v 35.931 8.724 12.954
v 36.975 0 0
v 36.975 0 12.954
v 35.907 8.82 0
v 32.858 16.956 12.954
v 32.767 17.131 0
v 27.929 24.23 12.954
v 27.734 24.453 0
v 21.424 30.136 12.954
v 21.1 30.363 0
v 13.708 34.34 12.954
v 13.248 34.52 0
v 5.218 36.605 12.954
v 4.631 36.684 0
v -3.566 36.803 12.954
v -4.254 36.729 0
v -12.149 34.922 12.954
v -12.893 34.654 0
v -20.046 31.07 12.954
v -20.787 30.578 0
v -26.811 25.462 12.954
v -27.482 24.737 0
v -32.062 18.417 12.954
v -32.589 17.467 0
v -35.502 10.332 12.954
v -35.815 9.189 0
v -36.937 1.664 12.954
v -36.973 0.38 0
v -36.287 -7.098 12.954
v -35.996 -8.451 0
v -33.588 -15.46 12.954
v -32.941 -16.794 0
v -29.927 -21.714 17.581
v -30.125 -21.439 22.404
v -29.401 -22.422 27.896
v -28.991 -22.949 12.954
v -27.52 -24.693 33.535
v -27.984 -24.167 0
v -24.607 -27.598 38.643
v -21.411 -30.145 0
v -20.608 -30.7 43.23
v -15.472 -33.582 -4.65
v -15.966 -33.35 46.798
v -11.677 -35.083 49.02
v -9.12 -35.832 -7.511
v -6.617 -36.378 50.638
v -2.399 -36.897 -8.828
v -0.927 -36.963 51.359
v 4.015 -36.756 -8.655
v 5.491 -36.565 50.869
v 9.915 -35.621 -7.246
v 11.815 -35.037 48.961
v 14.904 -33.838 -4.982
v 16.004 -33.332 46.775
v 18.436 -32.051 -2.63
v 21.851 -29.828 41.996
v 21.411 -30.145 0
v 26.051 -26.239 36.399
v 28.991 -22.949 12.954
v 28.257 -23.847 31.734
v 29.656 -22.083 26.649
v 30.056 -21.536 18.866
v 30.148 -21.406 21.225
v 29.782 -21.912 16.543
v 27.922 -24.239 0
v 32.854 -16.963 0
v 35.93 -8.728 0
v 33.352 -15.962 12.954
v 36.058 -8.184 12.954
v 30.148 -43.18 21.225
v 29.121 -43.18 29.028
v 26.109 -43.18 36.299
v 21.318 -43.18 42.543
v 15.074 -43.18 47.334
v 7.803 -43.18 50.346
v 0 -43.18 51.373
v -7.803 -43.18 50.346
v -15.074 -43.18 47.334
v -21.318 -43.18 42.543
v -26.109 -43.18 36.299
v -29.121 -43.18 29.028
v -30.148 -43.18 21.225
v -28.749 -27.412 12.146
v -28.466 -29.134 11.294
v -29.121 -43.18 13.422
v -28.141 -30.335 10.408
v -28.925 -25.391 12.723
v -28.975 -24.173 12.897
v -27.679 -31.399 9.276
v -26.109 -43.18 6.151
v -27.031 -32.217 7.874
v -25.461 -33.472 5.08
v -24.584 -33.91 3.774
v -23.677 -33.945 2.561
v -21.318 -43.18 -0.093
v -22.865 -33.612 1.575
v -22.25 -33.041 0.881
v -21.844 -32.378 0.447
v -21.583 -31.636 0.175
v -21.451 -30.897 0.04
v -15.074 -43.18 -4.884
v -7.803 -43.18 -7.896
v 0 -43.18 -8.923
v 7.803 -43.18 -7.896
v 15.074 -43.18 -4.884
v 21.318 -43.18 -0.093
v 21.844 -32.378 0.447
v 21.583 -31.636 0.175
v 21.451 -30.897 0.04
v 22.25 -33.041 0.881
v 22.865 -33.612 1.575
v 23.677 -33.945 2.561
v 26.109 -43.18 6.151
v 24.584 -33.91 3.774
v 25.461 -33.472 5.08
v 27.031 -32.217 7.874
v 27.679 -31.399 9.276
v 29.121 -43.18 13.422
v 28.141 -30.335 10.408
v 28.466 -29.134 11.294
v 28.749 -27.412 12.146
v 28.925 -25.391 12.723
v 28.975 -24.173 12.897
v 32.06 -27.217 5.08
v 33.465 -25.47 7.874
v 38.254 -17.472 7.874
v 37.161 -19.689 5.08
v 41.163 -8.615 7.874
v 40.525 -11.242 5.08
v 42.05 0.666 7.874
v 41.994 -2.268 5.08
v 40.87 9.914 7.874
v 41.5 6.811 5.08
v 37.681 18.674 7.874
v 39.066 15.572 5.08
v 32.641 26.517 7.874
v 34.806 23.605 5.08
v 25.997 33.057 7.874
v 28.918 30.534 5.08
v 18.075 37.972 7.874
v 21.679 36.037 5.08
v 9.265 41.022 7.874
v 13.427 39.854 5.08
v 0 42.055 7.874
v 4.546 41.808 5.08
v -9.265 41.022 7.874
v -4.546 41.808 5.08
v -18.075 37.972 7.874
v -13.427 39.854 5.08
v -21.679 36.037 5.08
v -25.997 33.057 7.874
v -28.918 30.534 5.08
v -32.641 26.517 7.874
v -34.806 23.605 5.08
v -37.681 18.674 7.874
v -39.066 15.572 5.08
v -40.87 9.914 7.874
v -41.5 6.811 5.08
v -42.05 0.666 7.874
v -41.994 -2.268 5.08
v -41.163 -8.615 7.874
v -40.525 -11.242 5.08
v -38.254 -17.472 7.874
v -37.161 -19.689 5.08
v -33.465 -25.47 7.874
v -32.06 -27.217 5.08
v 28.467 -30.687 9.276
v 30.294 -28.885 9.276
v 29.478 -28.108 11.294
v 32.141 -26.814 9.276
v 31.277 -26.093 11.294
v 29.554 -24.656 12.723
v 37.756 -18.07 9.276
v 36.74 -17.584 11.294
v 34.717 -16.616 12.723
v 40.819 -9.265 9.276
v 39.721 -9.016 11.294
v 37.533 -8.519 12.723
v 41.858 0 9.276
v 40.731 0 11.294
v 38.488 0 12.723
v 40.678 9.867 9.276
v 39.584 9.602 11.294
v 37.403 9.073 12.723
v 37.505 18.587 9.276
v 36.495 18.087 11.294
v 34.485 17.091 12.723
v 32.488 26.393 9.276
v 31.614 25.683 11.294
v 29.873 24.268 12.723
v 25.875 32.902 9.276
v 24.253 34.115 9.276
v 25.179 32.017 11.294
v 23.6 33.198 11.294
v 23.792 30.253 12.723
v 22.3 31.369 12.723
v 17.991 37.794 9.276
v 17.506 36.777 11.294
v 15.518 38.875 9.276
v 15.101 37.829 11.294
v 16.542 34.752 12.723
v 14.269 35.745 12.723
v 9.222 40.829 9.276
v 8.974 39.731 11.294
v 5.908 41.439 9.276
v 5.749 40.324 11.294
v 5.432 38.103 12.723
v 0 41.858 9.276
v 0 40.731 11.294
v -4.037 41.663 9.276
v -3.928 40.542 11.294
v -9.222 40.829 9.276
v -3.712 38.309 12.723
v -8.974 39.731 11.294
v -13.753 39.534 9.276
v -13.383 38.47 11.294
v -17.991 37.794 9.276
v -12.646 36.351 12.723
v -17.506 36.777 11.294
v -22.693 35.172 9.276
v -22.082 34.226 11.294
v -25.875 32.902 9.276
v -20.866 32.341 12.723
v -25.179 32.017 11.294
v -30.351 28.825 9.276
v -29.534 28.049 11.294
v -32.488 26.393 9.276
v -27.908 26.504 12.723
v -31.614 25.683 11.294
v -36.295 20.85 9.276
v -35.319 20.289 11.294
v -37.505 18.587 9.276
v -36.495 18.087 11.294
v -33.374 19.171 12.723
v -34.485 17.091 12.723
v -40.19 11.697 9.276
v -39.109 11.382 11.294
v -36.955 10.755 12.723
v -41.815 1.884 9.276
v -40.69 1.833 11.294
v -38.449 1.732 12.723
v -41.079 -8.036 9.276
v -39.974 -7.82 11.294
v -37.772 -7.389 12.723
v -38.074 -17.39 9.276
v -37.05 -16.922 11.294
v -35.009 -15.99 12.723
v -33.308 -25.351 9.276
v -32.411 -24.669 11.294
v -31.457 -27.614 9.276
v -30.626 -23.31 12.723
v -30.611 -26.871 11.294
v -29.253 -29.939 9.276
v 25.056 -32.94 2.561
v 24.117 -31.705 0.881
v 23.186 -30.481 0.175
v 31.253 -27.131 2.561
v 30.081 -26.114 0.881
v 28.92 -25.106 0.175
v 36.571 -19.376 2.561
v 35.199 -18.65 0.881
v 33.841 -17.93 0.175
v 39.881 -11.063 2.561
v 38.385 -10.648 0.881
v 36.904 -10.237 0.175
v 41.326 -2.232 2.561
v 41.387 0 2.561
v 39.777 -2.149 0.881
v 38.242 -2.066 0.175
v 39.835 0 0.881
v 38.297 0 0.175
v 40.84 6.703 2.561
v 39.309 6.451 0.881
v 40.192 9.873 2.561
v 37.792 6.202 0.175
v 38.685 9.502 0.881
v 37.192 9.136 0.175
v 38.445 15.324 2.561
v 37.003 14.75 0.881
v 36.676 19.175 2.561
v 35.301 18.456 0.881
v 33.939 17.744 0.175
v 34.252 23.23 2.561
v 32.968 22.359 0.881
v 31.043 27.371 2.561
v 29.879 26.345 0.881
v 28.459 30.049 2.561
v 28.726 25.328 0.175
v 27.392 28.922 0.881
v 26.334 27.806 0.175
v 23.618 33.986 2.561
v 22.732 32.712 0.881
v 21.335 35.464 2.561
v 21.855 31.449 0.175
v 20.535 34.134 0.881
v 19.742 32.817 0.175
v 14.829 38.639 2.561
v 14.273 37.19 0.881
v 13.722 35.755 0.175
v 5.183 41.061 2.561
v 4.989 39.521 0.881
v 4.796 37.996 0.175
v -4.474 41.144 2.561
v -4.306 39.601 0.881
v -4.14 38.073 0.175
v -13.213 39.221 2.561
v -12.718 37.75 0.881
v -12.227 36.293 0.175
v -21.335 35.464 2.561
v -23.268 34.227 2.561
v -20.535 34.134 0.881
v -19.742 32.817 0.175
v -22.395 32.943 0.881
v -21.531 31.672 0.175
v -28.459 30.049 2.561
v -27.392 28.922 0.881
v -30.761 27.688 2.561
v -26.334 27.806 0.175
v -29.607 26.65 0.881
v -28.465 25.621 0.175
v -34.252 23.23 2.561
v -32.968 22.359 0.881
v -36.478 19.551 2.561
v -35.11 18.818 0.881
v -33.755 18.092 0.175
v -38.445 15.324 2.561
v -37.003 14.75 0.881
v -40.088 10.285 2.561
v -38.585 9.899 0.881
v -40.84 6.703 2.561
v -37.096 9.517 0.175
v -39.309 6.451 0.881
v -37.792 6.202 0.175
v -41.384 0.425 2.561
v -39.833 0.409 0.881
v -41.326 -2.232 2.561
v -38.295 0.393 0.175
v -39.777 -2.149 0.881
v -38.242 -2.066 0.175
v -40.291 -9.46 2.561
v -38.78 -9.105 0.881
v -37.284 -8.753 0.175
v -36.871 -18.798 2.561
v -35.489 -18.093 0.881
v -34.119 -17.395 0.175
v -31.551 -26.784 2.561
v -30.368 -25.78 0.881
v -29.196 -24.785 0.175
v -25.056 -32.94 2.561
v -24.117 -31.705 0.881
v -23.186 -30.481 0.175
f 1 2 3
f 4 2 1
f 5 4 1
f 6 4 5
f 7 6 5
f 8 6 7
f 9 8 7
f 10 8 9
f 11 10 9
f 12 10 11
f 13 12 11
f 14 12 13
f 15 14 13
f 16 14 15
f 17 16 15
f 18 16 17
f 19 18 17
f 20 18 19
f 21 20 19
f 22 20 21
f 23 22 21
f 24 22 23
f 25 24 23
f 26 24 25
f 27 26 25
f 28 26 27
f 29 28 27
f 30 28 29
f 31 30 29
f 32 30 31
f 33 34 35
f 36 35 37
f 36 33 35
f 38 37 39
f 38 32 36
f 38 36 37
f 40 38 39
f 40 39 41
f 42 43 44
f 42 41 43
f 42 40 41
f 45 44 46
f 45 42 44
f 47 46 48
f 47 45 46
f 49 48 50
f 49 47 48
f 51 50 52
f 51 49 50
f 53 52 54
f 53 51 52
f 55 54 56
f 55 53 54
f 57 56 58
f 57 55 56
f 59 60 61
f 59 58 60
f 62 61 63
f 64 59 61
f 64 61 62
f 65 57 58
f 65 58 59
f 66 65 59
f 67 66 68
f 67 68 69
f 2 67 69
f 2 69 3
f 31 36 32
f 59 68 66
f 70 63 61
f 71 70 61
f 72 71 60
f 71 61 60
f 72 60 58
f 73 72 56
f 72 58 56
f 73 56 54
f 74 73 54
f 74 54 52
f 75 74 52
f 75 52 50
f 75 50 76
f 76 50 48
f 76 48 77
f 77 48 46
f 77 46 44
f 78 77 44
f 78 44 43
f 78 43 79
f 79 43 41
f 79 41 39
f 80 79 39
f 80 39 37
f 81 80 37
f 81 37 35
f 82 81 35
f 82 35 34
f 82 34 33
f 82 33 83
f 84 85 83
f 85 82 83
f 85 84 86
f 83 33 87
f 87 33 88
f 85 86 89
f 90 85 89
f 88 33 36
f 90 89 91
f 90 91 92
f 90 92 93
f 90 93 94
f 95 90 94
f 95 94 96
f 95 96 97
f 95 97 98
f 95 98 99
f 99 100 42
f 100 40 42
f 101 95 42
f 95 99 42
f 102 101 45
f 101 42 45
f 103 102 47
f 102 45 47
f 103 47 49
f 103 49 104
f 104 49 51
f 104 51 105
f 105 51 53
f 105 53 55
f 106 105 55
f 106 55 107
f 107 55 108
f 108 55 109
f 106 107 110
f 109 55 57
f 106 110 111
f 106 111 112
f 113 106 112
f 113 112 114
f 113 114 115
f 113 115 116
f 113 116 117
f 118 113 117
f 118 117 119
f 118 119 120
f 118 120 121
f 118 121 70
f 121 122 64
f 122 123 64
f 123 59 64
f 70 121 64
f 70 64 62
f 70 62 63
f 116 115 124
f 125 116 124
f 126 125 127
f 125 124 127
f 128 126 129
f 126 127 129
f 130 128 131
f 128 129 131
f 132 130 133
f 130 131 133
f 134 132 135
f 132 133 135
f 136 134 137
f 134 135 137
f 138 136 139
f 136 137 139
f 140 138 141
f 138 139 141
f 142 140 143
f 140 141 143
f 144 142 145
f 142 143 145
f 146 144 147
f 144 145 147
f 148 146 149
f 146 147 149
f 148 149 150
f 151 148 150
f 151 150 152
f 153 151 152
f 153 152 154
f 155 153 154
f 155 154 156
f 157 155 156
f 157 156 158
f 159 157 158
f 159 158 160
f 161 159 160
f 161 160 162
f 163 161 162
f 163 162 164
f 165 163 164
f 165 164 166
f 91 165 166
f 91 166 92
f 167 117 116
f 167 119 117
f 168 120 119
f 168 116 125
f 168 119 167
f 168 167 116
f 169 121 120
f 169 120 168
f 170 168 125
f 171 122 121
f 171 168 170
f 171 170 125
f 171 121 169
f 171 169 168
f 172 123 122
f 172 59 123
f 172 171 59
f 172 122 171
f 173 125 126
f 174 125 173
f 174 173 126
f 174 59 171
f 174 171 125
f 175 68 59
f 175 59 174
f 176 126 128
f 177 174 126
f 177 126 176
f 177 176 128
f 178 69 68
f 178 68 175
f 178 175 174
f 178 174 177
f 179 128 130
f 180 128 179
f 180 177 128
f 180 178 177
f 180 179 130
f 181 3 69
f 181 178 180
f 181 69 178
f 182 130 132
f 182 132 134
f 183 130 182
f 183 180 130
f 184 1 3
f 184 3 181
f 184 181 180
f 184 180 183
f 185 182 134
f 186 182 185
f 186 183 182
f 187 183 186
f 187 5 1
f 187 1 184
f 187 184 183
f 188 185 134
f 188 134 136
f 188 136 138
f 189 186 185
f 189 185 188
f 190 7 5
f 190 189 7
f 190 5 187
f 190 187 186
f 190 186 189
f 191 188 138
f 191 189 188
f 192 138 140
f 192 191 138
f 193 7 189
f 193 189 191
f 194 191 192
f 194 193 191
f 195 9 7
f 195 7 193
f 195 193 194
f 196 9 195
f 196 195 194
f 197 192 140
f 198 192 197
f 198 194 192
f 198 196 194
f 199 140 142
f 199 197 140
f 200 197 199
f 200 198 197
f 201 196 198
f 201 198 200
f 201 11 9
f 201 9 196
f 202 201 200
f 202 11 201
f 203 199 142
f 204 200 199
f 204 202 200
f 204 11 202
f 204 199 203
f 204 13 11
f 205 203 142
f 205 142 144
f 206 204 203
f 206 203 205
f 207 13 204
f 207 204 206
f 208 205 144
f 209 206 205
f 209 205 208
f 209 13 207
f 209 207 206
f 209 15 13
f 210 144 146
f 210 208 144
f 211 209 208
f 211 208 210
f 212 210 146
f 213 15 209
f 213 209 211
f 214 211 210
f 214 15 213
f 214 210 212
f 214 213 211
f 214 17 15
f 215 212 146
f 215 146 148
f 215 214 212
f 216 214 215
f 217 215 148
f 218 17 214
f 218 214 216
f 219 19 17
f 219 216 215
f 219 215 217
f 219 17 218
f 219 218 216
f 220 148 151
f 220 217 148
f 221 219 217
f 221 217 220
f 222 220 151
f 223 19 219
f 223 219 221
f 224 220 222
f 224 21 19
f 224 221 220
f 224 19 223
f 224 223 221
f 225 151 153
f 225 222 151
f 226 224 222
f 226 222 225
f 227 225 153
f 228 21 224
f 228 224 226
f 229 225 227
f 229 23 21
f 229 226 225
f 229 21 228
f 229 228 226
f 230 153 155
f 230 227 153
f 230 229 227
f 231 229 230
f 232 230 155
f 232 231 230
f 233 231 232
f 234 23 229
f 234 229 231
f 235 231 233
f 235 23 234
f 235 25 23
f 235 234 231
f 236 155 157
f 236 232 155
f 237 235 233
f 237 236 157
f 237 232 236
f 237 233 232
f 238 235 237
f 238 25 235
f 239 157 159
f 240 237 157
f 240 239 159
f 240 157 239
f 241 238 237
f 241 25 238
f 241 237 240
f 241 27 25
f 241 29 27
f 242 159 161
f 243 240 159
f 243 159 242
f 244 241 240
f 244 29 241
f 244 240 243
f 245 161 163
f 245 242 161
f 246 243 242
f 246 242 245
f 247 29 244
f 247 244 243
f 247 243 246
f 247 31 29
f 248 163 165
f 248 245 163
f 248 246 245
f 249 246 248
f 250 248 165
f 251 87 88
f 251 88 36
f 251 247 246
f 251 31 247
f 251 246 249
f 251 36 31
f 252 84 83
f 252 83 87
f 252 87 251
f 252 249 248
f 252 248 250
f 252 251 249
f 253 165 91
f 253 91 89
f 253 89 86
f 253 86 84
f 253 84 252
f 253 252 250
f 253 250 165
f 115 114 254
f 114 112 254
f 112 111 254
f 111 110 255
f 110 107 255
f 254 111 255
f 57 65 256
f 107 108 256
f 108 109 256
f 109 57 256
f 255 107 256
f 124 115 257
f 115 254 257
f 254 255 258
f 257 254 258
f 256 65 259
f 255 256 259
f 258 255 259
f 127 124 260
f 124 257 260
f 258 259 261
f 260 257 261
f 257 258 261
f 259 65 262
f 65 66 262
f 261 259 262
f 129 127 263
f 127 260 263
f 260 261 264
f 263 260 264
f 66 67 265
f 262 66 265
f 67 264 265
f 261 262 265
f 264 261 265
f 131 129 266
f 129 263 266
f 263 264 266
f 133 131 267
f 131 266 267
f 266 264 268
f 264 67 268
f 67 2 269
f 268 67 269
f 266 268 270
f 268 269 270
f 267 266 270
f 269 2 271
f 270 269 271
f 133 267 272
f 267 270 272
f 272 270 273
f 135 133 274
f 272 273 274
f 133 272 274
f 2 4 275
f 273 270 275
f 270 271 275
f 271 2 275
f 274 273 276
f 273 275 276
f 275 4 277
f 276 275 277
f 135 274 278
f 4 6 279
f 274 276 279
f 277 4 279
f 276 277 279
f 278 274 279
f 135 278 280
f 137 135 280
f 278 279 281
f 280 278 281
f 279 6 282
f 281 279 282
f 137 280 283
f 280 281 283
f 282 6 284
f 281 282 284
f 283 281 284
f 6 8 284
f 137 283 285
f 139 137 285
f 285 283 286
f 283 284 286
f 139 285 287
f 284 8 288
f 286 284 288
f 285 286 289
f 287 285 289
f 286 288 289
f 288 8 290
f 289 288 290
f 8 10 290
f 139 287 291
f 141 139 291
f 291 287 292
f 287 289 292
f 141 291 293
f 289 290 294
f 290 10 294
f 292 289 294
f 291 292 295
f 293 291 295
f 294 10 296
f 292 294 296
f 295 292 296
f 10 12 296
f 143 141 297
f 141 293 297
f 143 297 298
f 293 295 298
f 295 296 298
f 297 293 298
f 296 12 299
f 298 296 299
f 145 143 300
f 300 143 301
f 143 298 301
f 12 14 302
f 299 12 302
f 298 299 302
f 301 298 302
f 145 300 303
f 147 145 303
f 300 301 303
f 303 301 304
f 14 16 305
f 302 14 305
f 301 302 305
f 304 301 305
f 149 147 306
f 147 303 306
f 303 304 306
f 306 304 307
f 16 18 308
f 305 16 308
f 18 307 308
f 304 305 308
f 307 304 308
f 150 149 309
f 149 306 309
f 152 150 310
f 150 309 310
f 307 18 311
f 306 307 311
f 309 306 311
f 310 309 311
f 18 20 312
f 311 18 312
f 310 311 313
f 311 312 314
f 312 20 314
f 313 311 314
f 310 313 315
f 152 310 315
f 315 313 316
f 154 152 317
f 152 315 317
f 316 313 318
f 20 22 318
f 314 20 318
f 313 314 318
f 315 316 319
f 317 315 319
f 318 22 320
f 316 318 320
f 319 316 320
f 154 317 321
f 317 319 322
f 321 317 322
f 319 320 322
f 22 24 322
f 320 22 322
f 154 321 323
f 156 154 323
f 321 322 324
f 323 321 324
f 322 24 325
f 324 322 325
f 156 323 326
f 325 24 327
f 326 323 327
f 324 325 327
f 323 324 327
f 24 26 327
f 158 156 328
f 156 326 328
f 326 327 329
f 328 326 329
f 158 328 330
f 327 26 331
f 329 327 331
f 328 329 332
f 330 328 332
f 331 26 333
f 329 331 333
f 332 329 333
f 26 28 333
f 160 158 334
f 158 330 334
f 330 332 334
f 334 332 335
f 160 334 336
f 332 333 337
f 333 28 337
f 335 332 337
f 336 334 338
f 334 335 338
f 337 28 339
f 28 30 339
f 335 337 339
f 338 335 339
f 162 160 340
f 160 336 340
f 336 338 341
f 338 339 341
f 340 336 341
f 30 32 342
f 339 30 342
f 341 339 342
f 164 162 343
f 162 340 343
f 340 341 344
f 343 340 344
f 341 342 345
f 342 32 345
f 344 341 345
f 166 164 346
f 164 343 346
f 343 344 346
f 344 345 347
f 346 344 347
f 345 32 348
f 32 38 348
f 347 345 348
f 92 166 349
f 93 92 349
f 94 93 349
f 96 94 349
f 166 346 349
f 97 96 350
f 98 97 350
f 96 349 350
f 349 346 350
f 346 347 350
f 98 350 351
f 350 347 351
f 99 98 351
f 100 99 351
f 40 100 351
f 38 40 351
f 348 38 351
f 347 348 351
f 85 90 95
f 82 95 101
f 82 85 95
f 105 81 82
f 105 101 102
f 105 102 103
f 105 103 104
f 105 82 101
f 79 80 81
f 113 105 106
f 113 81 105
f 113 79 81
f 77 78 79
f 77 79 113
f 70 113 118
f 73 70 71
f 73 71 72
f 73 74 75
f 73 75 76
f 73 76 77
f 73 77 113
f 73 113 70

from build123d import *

# Parameters (mm, degrees)
F0_R     = 42.0549170166
F1_DEPTH = 12.954
F2_R     = 5.08
F4_R     = 30.1481321403
F5_DEPTH = 43.18
F6_R     = 36.9749170166
F7_DEPTH = 77.47
F8_R     = 36.9749170166
F9_DEPTH = 29.464


# Not quite as in the source:
# - a feature of the source that left no trace in its solid (it failed there, or was rolled back) is left out


with BuildPart() as f1:
    # F0 (on Top) → F1 (new body)
    with BuildSketch(Plane.XY):
        Circle(F0_R)
    extrude(amount=F1_DEPTH)

    # F2
    f2_edges = [f1.edges().sort_by_distance(p)[0] for p in [
        (-42.054917, 0, 12.954),
        (-42.054917, 0, 0),
    ]]
    fillet(f2_edges, radius=F2_R)

    # F4 (on Front) → F5 (join)
    with BuildSketch(Plane.XZ):
        with Locations((0, 21.2246719748)):
            Circle(F4_R)
    extrude(amount=F5_DEPTH)

    # F6 (on Top) → F7 (cut)
    with BuildSketch(Plane.XY):
        Circle(F6_R)
    extrude(amount=F7_DEPTH, mode=Mode.SUBTRACT)

    # F8 (on Top) → F9 (cut)
    with BuildSketch(Plane.XY):
        Circle(F8_R)
    extrude(amount=-F9_DEPTH, mode=Mode.SUBTRACT)


solid = f1.part
